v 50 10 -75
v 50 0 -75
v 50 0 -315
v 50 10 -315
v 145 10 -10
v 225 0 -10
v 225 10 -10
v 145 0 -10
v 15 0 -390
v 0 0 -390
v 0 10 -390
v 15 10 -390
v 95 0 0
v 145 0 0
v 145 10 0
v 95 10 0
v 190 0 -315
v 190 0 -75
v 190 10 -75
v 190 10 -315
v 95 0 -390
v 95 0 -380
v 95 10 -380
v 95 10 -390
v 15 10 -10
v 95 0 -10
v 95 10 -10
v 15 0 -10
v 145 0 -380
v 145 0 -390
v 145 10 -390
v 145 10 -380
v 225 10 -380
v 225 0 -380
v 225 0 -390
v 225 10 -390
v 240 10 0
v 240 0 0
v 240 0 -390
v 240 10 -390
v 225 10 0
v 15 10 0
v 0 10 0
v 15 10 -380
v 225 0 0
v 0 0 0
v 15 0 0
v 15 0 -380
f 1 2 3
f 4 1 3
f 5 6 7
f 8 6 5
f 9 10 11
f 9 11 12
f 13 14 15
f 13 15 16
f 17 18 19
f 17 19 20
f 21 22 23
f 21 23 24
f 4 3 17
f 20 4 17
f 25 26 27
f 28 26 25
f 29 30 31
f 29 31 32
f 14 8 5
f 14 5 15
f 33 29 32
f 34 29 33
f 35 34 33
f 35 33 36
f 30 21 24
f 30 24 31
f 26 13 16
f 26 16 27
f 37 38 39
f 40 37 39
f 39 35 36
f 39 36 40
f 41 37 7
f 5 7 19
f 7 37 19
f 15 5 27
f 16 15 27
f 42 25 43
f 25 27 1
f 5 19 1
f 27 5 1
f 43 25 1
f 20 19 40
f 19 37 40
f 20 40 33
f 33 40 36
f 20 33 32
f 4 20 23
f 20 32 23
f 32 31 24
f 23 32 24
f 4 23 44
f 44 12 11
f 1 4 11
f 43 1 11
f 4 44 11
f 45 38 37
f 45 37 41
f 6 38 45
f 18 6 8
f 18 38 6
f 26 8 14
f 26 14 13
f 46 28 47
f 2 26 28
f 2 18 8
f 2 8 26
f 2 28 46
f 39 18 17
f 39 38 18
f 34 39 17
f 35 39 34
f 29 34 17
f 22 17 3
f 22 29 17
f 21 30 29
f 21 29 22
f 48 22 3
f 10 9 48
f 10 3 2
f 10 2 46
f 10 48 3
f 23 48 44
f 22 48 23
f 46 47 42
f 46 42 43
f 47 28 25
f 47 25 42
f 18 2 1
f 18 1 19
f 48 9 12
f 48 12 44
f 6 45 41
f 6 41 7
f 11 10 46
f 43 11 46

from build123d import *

# Parameters (mm, degrees)
ESQUISSE1_W        = 140
ESQUISSE1_H        = 240
BOSS_EXTRU_1_DEPTH = 10


with BuildPart() as part:
    # Esquisse1 → Boss.-Extru.1 (new body)
    with BuildSketch(Plane(origin=(0, 0, 0), x_dir=(1, 0, 0), z_dir=(0, 1, 0))):
        Polygon((15, 10), (15, 0), (0, 0), (0, 10), (0, 380), (0, 390), (15, 390), (15, 380), (95, 380), (95, 390), (145, 390), (145, 380), (225, 380), (225, 390), (240, 390), (240, 380), (240, 10), (240, 0), (225, 0), (225, 10), (145, 10), (145, 0), (95, 0), (95, 10), align=None)
        with Locations((120, 195)):
            Rectangle(ESQUISSE1_W, ESQUISSE1_H, mode=Mode.SUBTRACT)
    extrude(amount=BOSS_EXTRU_1_DEPTH)


solid = part.part
